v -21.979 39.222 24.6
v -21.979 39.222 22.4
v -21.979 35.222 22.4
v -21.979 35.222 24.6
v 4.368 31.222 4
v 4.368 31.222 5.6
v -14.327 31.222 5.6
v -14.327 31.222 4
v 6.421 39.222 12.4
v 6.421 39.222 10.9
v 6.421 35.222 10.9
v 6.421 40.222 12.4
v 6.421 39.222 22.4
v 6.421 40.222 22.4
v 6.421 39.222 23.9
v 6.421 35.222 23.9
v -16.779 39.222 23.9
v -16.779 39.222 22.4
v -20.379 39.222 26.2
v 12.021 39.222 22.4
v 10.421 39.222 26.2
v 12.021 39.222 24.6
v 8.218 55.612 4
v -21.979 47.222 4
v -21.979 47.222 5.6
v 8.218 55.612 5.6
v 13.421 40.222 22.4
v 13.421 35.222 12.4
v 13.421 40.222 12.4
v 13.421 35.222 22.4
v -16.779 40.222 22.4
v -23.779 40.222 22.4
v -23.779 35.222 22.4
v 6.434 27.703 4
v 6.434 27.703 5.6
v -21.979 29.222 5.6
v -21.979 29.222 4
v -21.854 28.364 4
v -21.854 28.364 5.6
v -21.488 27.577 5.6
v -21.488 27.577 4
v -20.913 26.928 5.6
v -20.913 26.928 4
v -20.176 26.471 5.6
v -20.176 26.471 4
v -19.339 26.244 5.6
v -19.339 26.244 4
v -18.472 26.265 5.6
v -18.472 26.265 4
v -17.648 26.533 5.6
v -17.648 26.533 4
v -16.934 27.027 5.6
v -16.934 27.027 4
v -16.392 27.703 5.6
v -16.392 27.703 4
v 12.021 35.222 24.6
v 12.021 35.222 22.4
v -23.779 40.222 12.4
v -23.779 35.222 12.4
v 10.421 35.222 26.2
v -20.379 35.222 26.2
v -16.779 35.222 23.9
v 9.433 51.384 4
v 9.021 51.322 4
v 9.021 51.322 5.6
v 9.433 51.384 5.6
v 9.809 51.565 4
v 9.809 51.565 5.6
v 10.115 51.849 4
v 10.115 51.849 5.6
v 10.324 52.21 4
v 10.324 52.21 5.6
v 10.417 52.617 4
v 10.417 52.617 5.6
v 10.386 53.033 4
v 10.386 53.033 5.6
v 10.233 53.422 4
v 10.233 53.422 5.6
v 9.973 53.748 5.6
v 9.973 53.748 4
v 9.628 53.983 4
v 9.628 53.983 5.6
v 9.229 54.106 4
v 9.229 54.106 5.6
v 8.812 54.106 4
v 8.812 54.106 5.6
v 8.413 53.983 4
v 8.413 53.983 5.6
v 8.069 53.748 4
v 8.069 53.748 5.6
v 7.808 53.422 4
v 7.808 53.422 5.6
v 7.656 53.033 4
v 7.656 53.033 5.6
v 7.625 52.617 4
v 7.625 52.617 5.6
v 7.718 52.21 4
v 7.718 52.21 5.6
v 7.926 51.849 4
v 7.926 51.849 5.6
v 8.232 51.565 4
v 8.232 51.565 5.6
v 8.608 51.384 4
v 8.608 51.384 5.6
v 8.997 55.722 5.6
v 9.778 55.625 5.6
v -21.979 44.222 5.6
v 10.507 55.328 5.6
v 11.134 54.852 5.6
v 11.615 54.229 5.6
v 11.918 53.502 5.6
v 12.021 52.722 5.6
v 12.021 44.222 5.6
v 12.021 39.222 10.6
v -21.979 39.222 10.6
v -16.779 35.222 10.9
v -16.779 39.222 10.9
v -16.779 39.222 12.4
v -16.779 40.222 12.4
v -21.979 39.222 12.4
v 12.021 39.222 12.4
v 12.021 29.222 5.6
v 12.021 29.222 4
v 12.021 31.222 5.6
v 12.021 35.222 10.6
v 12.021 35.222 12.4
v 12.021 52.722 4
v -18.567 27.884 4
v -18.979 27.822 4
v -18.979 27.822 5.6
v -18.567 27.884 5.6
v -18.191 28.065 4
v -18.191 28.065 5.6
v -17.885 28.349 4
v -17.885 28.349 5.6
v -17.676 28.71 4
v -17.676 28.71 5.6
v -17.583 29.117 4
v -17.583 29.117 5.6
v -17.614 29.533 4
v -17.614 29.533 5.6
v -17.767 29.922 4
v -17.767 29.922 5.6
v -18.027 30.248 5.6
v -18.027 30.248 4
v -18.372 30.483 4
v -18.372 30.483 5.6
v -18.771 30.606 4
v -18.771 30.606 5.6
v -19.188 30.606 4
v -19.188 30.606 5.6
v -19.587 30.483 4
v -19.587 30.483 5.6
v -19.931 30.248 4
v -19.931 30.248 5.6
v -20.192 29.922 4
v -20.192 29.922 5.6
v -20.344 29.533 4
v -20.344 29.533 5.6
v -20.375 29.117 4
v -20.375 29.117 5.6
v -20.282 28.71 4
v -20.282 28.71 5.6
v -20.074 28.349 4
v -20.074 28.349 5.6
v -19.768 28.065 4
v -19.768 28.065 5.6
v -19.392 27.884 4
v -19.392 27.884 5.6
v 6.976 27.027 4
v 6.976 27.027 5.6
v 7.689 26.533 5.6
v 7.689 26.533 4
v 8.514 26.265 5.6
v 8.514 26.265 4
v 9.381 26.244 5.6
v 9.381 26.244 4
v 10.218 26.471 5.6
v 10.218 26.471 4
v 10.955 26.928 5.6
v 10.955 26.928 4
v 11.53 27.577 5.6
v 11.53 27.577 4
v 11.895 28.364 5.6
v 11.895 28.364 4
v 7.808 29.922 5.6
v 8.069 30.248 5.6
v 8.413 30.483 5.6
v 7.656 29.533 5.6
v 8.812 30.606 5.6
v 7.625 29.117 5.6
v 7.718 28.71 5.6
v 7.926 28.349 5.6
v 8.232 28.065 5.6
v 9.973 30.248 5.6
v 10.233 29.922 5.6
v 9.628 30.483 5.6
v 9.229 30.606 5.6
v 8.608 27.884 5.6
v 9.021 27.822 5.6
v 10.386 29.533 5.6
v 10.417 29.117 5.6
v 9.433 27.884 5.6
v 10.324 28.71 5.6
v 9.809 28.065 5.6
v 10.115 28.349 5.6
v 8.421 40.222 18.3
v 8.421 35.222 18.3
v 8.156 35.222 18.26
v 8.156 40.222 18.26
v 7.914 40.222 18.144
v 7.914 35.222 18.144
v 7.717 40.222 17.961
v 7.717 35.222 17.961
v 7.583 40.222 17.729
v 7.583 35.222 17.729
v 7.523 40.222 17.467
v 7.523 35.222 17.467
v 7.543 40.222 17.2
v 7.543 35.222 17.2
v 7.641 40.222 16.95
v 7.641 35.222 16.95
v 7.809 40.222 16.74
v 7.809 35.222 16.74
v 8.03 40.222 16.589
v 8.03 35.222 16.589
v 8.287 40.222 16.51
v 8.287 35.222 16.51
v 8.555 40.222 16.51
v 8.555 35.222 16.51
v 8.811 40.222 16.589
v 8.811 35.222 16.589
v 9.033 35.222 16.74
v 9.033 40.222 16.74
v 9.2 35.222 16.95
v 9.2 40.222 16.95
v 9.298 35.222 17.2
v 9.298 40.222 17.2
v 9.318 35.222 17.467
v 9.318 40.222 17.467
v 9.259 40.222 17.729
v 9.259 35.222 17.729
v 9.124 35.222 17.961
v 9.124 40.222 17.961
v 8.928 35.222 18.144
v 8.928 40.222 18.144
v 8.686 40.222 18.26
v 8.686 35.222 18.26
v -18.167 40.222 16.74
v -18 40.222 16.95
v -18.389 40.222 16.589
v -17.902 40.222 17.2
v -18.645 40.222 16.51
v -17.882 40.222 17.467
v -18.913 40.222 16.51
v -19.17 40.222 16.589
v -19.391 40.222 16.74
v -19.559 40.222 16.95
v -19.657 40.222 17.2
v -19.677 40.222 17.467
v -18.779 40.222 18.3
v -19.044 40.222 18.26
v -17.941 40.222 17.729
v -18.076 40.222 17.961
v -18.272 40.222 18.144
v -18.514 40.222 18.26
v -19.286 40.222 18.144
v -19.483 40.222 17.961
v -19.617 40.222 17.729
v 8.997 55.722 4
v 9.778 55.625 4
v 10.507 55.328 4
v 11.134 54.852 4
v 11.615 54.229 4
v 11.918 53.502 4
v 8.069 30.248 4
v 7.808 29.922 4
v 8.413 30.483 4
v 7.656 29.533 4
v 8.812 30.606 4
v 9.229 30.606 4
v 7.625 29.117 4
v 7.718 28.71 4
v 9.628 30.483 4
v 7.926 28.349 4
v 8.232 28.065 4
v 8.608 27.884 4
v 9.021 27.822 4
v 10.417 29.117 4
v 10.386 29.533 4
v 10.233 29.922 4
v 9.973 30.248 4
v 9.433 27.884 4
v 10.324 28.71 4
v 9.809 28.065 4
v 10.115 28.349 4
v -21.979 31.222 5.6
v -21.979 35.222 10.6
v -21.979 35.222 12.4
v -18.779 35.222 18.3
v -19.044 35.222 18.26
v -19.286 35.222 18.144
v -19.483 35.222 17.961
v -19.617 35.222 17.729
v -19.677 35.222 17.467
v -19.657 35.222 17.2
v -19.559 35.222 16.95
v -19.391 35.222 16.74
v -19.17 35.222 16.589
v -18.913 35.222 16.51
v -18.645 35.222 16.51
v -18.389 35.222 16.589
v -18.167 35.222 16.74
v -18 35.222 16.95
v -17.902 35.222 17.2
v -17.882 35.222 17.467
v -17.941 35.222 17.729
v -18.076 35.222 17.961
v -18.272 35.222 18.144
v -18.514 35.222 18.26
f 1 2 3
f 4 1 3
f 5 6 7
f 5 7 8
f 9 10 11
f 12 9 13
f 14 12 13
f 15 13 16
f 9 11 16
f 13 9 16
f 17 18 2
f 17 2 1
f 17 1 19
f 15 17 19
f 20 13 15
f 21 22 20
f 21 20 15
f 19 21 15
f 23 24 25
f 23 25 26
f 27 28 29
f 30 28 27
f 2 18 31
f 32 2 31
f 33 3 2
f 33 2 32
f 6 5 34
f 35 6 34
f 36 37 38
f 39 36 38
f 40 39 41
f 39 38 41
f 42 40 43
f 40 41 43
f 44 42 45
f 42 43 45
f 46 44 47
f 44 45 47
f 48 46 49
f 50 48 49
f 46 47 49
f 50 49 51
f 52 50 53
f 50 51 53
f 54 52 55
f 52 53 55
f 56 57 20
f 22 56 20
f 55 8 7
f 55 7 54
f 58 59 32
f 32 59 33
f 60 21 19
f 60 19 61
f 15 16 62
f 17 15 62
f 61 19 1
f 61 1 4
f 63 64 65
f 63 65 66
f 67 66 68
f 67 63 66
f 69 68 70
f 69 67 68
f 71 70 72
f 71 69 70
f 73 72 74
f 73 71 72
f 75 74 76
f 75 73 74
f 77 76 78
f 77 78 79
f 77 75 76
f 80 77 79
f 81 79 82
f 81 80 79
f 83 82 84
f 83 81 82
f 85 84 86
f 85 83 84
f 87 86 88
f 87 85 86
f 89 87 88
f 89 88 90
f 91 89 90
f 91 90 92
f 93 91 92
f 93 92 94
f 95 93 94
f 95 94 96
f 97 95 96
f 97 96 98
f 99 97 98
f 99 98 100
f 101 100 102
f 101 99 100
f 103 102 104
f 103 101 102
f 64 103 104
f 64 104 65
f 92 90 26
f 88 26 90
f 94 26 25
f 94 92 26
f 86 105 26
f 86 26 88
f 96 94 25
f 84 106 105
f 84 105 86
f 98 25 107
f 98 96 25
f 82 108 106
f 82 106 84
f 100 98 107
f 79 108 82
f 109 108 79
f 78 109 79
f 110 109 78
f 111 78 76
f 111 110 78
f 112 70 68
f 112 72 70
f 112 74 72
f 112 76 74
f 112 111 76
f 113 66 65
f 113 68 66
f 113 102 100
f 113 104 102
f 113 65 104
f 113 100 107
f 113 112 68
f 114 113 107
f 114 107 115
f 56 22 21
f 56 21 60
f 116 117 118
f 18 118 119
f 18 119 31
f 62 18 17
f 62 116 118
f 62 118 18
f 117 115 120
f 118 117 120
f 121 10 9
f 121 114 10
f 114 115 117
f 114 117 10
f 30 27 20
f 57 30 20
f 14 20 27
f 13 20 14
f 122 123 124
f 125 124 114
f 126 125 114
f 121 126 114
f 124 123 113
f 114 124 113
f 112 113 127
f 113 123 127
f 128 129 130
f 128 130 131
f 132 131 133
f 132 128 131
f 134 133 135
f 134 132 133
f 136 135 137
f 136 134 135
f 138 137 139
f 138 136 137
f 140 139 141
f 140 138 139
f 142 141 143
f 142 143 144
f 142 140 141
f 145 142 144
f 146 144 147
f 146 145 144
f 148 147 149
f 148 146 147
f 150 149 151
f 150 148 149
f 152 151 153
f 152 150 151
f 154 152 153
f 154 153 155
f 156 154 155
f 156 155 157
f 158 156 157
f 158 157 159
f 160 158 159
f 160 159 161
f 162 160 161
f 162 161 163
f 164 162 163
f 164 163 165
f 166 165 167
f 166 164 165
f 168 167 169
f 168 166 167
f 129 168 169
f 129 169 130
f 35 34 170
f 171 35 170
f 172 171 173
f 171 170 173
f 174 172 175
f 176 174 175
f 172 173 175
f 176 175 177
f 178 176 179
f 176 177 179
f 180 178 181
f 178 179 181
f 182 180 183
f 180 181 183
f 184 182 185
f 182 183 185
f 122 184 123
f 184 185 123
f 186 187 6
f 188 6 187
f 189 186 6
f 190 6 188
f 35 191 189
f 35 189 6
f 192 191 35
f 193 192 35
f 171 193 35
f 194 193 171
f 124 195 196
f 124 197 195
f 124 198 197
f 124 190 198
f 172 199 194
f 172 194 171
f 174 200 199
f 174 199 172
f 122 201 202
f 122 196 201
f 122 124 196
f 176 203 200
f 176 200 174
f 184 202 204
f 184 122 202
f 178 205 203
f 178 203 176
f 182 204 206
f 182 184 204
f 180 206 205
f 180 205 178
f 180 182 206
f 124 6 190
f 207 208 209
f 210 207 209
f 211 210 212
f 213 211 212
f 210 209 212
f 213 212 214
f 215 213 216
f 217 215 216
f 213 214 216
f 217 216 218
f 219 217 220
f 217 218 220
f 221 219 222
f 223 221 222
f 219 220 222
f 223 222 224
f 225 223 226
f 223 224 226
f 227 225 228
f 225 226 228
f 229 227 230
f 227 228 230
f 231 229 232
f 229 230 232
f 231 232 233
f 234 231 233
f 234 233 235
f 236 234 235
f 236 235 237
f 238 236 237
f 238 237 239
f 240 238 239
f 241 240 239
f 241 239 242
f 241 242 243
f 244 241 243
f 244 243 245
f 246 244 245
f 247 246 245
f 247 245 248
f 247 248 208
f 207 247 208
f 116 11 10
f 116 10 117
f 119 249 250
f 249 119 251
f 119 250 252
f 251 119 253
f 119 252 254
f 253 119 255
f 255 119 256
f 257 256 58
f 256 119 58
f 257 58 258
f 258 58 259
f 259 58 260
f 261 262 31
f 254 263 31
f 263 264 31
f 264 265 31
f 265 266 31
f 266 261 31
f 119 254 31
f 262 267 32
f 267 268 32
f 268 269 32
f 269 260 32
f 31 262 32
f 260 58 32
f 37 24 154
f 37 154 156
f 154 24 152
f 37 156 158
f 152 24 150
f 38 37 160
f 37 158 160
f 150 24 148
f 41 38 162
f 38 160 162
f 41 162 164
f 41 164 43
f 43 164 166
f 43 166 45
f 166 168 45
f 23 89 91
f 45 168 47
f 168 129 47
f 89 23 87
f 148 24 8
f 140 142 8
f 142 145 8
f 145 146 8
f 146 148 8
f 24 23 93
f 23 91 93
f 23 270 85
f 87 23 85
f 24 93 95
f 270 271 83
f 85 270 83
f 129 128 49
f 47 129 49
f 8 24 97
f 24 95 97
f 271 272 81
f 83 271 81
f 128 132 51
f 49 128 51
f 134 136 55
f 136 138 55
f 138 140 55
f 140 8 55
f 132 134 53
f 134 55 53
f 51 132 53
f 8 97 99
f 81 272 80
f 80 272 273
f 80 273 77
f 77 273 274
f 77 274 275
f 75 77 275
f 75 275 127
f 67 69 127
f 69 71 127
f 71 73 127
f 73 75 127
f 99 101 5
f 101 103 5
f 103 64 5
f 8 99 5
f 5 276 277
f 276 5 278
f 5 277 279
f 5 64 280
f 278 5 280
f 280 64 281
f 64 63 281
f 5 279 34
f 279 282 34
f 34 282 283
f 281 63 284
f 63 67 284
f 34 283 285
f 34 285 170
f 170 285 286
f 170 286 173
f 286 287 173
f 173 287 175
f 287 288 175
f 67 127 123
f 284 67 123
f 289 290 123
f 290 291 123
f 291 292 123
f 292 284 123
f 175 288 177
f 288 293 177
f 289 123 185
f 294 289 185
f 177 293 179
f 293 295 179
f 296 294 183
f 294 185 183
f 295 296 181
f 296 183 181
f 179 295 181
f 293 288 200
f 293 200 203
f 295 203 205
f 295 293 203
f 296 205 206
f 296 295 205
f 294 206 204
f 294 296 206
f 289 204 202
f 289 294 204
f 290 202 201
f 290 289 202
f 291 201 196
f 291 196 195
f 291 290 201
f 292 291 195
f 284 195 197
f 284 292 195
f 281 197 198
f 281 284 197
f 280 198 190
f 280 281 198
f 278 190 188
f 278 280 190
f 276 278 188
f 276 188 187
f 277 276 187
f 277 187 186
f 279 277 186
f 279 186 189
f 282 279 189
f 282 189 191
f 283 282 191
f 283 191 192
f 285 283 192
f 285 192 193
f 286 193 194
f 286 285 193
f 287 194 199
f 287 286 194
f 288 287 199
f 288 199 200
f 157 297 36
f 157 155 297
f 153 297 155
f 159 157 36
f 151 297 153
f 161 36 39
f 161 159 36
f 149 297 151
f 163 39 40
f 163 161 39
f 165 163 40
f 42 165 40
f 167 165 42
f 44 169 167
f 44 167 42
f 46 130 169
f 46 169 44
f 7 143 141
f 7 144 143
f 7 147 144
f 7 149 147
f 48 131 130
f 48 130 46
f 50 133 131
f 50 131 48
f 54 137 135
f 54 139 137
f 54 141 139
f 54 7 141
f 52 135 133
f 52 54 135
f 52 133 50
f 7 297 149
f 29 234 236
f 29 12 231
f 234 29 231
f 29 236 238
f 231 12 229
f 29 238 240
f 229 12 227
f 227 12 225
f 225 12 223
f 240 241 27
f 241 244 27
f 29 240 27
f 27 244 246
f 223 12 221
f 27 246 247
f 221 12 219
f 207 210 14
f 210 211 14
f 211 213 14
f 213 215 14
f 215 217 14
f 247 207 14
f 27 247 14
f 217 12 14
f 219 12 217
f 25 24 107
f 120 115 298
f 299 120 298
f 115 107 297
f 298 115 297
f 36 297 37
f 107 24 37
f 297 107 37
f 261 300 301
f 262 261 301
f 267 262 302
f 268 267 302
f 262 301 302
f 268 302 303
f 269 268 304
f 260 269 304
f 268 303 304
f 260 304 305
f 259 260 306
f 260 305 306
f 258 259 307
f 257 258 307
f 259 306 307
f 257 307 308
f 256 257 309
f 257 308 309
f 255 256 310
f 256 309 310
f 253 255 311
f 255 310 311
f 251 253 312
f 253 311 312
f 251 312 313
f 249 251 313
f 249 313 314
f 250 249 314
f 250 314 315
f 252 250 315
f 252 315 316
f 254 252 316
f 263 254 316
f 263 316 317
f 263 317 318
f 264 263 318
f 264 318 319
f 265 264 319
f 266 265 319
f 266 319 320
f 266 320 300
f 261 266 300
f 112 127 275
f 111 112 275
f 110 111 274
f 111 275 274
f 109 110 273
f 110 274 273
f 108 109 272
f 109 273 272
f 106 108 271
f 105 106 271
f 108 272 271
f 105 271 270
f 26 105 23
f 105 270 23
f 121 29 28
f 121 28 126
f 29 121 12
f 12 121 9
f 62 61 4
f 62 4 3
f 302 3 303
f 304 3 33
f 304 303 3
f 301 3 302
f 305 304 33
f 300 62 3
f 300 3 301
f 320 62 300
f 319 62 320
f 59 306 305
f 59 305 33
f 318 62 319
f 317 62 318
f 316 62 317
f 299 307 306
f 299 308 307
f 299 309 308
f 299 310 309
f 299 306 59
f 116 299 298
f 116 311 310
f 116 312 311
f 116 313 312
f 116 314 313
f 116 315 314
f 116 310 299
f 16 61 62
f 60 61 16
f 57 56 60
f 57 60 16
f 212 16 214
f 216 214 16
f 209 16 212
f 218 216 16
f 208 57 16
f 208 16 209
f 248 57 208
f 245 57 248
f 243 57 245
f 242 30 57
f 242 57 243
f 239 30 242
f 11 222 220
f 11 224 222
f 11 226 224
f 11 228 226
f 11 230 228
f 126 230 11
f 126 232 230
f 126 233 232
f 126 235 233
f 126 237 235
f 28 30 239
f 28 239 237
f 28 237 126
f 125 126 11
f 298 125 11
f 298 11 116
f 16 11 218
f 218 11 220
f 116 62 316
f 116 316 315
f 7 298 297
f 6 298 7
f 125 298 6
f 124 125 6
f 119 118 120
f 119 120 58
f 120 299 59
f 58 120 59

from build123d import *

# Parameters (mm, degrees)
PAD026_DEPTH            = 34
SKETCH034_R             = 0.9
POCKET006_DEPTH         = 12.001
SKETCH036_W             = 13
SKETCH036_H             = 23.2
POCKET007_DEPTH         = 12.001
SKETCH037_R             = 1.4
PAD027_DEPTH            = 1.6
SKETCH038_R             = 1.4
PAD028_DEPTH            = 1.6
SKETCH039_W             = 10
SKETCH039_H             = 7
SKETCH039_R             = 0.9
PAD029_DEPTH            = 5
CHAMFER002_SIZE         = 1.6
BODY006_PLACEMENT_ANGLE = 90


with BuildPart() as part:
    # Sketch035 → Pad026 (new body)
    with BuildSketch(Plane.XZ):
        Polygon((-12, 1.6), (-9, 1.6), (-4, 6.6), (-4, 22.2), (0, 22.2), (0, 6.6), (4, 1.6), (4, 0), (-3.601763, 0), (-12, 0), align=None)
    extrude(amount=PAD026_DEPTH)

    # Sketch034 → Pocket006 (cut, through all)
    with BuildSketch(Plane(origin=(0, 0, 0), x_dir=(0, 0, 1), z_dir=(1, 0, 0))):
        with Locations((13.4, 30.8)):
            Circle(SKETCH034_R)
        with Locations((13.4, 3.6)):
            Circle(SKETCH034_R)
    extrude(amount=-POCKET006_DEPTH, mode=Mode.SUBTRACT)

    # Sketch036 (on DatumPlane) → Pocket007 (cut, through all)
    with BuildSketch(Plane(origin=(0, 0, 0), x_dir=(0, 0, 1), z_dir=(1, 0, 0))):
        with Locations((13.4, 17.2)):
            Rectangle(SKETCH036_W, SKETCH036_H)
    extrude(amount=-POCKET007_DEPTH, mode=Mode.SUBTRACT)

    # Sketch037 → Pad027 (join)
    with BuildSketch(Plane.XY):
        with BuildLine():
            ThreePointArc((-17.5, 0), (-19.888457, -1.184712), (-20.390493, -3.803152))
            Line((-12, -34), (-20.390493, -3.803152))
            Line((-11.5, -34), (-12, -34))
            Line((-11.5, 0), (-11.5, -34))
            Line((-11.5, 0), (-17.5, 0))
        make_face()
        with Locations((-17.5, -3)):
            Circle(SKETCH037_R, mode=Mode.SUBTRACT)
    extrude(amount=PAD027_DEPTH)

    # Sketch038 → Pad028 (join)
    with BuildSketch(Plane.XY):
        with BuildLine():
            ThreePointArc((6, -34), (8.894987, -31.786799), (7.518515, -28.412702))
            Line((0, -24), (7.518515, -28.412702))
            Line((0, -34), (0, -24))
            Line((0, -34), (6, -34))
        make_face()
        with Locations((6, -31)):
            Circle(SKETCH038_R, mode=Mode.SUBTRACT)
        with BuildLine():
            ThreePointArc((7.518515, -5.587298), (8.894988, -2.213208), (6.000014, 0))
            Line((0, 0), (6.000014, 0))
            Line((0, 0), (0, -10))
            Line((0, -10), (7.518515, -5.587298))
        make_face()
        with Locations((6, -3)):
            Circle(SKETCH038_R, mode=Mode.SUBTRACT)
    extrude(amount=PAD028_DEPTH)

    # Sketch039 (on Face3 of Pad028) → Pad029 (join)
    with BuildSketch(Plane(origin=(0, 0, 0), x_dir=(0, 0, 1), z_dir=(1, 0, 0))):
        with Locations((13.4, 32.3)):
            Rectangle(SKETCH039_W, SKETCH039_H)
        with Locations((13.4, 30.8)):
            Circle(SKETCH039_R, mode=Mode.SUBTRACT)
        with Locations((13.4, 2.1)):
            Rectangle(SKETCH039_W, SKETCH039_H)
        with Locations((13.4, 3.6)):
            Circle(SKETCH039_R, mode=Mode.SUBTRACT)
    extrude(amount=-PAD029_DEPTH)

    # Chamfer002
    chamfer002_edges = [part.edges().sort_by_distance(p)[0] for p in [
        (-2, 0, 22.2),
        (-2, -34, 22.2),
    ]]
    chamfer(chamfer002_edges, length=CHAMFER002_SIZE)


with BuildPart() as part_1:
    # Body006 placement: moved
    add(part.part.moved(Location((12.020815, 35.221825, 4))).rotate(Axis((12.020815, 35.221825, 4), (0, 0, -1)), BODY006_PLACEMENT_ANGLE))


solid = part_1.part
